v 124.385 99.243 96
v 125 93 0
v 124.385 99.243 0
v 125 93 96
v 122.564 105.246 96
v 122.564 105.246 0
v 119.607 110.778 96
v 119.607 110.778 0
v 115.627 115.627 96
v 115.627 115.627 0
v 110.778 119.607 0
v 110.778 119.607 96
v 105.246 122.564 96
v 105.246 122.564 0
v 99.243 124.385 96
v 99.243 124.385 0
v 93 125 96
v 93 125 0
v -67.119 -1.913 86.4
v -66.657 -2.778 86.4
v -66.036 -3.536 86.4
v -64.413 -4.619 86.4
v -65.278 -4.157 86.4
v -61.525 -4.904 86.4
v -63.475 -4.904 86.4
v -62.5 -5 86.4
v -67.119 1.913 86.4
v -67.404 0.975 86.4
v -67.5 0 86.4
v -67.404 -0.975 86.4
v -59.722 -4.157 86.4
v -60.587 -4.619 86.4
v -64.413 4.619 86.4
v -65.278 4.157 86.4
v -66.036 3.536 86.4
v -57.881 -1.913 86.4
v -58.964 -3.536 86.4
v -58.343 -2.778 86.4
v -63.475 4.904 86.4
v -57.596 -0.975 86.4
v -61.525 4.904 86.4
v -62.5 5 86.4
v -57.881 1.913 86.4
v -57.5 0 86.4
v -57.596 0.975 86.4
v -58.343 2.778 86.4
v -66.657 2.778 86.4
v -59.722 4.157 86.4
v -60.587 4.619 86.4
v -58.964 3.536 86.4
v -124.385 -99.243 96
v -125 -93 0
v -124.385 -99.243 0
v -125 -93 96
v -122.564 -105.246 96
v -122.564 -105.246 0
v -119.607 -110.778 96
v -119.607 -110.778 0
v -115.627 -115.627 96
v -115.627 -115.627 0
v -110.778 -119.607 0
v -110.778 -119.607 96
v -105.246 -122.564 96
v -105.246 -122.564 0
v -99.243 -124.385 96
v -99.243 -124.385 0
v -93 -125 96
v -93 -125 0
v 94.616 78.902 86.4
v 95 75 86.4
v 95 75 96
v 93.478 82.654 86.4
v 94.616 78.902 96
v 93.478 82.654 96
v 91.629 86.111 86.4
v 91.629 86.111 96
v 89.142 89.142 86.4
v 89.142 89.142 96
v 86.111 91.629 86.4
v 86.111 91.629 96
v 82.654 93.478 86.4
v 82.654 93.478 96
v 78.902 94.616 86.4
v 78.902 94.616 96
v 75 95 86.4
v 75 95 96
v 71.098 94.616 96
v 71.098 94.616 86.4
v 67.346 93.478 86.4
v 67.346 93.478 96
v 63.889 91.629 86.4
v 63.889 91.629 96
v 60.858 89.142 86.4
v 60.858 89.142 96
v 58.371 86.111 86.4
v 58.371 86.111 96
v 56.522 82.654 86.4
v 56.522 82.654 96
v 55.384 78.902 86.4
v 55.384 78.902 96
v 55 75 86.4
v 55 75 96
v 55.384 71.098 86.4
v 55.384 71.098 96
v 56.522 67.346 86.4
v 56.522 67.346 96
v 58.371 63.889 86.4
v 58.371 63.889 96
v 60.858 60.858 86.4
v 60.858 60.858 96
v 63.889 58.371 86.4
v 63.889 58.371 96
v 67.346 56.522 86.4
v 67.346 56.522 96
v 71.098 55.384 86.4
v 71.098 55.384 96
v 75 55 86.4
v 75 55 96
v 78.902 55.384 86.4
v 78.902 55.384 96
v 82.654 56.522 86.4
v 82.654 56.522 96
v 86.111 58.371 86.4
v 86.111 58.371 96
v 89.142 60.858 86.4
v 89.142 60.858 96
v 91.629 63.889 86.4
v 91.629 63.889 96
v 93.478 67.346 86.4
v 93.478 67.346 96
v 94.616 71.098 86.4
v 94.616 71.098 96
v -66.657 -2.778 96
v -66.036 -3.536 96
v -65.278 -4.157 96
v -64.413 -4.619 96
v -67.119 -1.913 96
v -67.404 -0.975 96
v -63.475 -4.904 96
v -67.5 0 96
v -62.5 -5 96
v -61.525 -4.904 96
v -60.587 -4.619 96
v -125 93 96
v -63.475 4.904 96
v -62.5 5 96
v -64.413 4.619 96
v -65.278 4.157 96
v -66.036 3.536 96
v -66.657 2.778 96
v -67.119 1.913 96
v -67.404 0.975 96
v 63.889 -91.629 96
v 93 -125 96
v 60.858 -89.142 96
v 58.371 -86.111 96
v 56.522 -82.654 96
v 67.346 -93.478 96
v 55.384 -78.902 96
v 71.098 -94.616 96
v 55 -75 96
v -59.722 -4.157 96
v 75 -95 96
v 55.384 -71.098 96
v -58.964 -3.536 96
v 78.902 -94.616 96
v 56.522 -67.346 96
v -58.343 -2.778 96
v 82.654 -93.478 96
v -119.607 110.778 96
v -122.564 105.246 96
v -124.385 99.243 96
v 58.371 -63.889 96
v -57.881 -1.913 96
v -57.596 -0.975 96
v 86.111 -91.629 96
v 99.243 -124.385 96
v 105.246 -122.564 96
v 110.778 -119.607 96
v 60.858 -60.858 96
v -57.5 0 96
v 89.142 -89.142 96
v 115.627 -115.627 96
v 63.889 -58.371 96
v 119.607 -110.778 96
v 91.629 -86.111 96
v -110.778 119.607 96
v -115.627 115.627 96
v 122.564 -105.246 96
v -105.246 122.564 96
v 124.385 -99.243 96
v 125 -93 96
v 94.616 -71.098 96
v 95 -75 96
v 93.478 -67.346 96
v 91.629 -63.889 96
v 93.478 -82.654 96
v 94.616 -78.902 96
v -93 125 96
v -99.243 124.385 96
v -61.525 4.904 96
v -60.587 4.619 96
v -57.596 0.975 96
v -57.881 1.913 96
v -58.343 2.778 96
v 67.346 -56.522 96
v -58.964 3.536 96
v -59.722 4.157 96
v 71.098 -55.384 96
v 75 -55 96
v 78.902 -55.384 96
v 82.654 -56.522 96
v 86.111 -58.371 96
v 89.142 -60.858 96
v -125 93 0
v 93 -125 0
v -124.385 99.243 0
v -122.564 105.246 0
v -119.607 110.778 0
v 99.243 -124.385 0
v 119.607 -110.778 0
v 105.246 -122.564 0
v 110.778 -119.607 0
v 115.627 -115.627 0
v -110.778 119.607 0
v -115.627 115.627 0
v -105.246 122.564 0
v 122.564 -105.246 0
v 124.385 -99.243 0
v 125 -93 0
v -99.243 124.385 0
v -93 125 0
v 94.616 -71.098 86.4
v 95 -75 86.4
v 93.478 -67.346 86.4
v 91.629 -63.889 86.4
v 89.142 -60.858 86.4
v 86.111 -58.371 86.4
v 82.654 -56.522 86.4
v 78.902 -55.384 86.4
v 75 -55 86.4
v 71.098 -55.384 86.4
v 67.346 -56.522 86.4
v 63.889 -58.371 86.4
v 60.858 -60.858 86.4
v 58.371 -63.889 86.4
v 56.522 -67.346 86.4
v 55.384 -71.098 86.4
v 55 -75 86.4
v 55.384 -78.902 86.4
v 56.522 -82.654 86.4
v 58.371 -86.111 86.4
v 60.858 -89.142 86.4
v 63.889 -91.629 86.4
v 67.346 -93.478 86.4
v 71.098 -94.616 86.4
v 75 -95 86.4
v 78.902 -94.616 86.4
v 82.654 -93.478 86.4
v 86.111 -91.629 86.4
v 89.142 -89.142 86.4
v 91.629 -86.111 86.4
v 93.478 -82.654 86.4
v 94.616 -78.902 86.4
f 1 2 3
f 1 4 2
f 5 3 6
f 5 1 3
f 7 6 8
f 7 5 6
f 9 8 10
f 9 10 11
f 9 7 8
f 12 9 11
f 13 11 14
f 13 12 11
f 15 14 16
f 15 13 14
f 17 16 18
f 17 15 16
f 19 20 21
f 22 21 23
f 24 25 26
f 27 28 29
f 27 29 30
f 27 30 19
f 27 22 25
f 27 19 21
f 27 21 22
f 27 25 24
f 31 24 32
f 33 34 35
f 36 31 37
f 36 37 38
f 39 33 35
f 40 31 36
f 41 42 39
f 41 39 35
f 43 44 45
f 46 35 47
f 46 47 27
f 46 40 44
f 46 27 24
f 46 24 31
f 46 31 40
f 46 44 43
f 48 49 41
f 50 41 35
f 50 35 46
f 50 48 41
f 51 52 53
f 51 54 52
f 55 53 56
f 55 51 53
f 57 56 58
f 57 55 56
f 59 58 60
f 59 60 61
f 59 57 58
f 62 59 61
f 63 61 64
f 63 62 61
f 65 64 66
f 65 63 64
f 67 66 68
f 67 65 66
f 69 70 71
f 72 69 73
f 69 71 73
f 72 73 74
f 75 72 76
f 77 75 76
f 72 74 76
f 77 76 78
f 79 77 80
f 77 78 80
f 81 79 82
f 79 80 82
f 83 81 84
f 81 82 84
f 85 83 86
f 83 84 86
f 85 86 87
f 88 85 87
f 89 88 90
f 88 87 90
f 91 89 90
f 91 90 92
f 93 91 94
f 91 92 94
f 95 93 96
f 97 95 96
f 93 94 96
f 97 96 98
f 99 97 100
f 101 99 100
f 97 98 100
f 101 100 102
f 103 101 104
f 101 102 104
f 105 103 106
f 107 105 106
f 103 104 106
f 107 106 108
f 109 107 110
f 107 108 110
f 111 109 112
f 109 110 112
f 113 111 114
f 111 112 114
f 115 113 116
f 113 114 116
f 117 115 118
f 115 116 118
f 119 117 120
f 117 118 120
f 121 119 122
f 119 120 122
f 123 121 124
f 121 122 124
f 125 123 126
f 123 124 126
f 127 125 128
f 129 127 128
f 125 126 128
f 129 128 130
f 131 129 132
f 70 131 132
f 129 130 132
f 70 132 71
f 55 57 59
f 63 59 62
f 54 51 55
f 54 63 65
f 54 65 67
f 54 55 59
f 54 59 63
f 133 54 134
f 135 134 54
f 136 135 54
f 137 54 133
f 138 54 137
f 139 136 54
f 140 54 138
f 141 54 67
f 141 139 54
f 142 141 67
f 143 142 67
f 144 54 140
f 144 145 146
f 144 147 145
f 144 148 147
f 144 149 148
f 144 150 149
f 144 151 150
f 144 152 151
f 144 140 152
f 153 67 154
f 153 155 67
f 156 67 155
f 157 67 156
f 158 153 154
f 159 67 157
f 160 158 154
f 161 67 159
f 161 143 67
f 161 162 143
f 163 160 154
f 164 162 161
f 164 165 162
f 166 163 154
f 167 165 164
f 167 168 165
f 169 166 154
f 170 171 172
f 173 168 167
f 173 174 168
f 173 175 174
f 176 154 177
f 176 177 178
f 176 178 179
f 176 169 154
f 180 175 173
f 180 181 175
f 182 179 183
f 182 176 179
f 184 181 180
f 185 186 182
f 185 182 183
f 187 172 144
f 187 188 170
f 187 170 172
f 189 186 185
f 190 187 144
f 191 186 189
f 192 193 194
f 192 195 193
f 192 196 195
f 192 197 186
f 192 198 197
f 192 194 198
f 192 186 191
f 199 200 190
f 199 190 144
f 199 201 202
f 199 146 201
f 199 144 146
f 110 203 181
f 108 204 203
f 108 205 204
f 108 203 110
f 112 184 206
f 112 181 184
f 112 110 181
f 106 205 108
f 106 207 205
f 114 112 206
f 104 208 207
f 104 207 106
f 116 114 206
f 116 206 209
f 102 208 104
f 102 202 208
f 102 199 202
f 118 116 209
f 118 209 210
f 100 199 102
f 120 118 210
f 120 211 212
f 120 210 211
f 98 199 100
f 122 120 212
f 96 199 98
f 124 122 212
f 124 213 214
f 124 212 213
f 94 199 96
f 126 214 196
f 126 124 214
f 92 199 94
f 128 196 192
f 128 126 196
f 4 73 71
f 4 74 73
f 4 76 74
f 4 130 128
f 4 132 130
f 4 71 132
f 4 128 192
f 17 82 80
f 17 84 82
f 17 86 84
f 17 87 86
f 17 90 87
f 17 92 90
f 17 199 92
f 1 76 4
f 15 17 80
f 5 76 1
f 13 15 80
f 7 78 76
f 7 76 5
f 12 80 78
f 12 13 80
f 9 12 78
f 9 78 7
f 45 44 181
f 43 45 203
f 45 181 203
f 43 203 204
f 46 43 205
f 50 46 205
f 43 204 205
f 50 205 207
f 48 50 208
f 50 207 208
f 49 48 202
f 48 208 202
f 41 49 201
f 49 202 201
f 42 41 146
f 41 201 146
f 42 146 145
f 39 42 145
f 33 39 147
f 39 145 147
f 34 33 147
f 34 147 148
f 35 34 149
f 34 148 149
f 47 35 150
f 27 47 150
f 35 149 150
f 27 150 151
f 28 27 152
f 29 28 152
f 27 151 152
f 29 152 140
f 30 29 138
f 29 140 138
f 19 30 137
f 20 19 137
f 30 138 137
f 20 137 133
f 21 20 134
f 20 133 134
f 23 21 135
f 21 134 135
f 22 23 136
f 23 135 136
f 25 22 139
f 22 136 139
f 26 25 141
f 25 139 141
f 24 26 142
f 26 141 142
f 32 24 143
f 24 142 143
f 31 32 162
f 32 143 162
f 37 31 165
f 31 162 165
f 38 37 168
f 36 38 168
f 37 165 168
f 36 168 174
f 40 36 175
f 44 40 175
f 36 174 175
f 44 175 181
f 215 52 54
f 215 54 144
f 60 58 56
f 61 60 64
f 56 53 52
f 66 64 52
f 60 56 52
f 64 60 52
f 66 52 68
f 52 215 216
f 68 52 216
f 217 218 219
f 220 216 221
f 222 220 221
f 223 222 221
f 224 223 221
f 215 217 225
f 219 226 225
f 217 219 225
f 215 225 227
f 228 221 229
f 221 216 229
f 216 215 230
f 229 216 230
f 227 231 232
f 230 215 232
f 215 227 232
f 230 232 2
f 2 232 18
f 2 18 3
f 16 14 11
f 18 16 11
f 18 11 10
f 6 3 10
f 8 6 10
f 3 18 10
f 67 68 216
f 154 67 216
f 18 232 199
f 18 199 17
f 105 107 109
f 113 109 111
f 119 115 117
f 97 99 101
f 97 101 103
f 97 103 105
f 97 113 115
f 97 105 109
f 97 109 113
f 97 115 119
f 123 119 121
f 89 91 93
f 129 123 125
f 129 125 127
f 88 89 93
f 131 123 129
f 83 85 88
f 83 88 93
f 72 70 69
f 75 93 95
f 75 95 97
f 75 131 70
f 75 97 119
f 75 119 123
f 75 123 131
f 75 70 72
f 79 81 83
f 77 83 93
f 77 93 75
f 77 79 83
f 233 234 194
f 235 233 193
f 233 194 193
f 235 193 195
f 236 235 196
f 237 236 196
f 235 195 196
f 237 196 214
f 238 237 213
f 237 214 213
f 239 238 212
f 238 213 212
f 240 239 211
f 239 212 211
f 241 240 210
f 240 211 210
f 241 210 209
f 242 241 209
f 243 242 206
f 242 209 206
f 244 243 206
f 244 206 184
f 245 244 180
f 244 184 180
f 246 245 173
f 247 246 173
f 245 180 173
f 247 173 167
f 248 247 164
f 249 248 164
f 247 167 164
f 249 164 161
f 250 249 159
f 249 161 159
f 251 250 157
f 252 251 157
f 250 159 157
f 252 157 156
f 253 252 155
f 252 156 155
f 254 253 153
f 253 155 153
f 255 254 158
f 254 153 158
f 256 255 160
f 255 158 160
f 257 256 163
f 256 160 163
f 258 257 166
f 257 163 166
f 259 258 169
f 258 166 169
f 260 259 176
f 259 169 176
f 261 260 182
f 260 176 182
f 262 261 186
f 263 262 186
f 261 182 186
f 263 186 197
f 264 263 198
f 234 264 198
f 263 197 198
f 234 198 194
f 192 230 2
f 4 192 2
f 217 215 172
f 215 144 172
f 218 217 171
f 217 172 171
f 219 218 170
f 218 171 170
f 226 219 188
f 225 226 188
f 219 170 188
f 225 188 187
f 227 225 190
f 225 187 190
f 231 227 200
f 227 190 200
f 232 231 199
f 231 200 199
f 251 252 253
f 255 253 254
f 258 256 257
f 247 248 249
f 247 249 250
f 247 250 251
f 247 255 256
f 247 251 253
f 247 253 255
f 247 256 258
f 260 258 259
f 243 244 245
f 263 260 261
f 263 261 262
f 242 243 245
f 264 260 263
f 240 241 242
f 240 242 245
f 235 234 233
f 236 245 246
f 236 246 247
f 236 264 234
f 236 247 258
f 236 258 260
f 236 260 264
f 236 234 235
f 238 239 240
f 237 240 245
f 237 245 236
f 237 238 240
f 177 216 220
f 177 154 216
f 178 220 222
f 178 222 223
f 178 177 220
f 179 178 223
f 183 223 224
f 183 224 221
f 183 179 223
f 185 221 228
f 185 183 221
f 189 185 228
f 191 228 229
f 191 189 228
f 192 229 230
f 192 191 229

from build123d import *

# Parameters (mm, degrees)
ESQUISSE1_W             = 250
ESQUISSE1_H             = 250
BOSS_EXTRU_1_DEPTH      = 96
CONG_1_R                = 32
ESQUISSE2_R             = 20
ESQUISSE2_R_2           = 5
ENL_V_MAT_EXTRU_1_DEPTH = 9.6


with BuildPart() as part:
    # Esquisse1 → Boss.-Extru.1 (new body)
    with BuildSketch(Plane.XY):
        Rectangle(ESQUISSE1_W, ESQUISSE1_H)
    extrude(amount=BOSS_EXTRU_1_DEPTH)

    # Congé1
    cong_1_edges = [part.edges().sort_by_distance(p)[0] for p in [
        (125, -125, 48),
        (-125, -125, 48),
        (-125, 125, 48),
        (125, 125, 48),
    ]]
    fillet(cong_1_edges, radius=CONG_1_R)

    # Esquisse2 → Enlèv. mat.-Extru.1 (cut)
    with BuildSketch(Plane.XY.offset(96)):
        with Locations((75, 75)):
            Circle(ESQUISSE2_R)
        with Locations((75, -75)):
            Circle(ESQUISSE2_R)
        with Locations((-62.5, 0)):
            Circle(ESQUISSE2_R_2)
    extrude(amount=-ENL_V_MAT_EXTRU_1_DEPTH, mode=Mode.SUBTRACT)


solid = part.part
